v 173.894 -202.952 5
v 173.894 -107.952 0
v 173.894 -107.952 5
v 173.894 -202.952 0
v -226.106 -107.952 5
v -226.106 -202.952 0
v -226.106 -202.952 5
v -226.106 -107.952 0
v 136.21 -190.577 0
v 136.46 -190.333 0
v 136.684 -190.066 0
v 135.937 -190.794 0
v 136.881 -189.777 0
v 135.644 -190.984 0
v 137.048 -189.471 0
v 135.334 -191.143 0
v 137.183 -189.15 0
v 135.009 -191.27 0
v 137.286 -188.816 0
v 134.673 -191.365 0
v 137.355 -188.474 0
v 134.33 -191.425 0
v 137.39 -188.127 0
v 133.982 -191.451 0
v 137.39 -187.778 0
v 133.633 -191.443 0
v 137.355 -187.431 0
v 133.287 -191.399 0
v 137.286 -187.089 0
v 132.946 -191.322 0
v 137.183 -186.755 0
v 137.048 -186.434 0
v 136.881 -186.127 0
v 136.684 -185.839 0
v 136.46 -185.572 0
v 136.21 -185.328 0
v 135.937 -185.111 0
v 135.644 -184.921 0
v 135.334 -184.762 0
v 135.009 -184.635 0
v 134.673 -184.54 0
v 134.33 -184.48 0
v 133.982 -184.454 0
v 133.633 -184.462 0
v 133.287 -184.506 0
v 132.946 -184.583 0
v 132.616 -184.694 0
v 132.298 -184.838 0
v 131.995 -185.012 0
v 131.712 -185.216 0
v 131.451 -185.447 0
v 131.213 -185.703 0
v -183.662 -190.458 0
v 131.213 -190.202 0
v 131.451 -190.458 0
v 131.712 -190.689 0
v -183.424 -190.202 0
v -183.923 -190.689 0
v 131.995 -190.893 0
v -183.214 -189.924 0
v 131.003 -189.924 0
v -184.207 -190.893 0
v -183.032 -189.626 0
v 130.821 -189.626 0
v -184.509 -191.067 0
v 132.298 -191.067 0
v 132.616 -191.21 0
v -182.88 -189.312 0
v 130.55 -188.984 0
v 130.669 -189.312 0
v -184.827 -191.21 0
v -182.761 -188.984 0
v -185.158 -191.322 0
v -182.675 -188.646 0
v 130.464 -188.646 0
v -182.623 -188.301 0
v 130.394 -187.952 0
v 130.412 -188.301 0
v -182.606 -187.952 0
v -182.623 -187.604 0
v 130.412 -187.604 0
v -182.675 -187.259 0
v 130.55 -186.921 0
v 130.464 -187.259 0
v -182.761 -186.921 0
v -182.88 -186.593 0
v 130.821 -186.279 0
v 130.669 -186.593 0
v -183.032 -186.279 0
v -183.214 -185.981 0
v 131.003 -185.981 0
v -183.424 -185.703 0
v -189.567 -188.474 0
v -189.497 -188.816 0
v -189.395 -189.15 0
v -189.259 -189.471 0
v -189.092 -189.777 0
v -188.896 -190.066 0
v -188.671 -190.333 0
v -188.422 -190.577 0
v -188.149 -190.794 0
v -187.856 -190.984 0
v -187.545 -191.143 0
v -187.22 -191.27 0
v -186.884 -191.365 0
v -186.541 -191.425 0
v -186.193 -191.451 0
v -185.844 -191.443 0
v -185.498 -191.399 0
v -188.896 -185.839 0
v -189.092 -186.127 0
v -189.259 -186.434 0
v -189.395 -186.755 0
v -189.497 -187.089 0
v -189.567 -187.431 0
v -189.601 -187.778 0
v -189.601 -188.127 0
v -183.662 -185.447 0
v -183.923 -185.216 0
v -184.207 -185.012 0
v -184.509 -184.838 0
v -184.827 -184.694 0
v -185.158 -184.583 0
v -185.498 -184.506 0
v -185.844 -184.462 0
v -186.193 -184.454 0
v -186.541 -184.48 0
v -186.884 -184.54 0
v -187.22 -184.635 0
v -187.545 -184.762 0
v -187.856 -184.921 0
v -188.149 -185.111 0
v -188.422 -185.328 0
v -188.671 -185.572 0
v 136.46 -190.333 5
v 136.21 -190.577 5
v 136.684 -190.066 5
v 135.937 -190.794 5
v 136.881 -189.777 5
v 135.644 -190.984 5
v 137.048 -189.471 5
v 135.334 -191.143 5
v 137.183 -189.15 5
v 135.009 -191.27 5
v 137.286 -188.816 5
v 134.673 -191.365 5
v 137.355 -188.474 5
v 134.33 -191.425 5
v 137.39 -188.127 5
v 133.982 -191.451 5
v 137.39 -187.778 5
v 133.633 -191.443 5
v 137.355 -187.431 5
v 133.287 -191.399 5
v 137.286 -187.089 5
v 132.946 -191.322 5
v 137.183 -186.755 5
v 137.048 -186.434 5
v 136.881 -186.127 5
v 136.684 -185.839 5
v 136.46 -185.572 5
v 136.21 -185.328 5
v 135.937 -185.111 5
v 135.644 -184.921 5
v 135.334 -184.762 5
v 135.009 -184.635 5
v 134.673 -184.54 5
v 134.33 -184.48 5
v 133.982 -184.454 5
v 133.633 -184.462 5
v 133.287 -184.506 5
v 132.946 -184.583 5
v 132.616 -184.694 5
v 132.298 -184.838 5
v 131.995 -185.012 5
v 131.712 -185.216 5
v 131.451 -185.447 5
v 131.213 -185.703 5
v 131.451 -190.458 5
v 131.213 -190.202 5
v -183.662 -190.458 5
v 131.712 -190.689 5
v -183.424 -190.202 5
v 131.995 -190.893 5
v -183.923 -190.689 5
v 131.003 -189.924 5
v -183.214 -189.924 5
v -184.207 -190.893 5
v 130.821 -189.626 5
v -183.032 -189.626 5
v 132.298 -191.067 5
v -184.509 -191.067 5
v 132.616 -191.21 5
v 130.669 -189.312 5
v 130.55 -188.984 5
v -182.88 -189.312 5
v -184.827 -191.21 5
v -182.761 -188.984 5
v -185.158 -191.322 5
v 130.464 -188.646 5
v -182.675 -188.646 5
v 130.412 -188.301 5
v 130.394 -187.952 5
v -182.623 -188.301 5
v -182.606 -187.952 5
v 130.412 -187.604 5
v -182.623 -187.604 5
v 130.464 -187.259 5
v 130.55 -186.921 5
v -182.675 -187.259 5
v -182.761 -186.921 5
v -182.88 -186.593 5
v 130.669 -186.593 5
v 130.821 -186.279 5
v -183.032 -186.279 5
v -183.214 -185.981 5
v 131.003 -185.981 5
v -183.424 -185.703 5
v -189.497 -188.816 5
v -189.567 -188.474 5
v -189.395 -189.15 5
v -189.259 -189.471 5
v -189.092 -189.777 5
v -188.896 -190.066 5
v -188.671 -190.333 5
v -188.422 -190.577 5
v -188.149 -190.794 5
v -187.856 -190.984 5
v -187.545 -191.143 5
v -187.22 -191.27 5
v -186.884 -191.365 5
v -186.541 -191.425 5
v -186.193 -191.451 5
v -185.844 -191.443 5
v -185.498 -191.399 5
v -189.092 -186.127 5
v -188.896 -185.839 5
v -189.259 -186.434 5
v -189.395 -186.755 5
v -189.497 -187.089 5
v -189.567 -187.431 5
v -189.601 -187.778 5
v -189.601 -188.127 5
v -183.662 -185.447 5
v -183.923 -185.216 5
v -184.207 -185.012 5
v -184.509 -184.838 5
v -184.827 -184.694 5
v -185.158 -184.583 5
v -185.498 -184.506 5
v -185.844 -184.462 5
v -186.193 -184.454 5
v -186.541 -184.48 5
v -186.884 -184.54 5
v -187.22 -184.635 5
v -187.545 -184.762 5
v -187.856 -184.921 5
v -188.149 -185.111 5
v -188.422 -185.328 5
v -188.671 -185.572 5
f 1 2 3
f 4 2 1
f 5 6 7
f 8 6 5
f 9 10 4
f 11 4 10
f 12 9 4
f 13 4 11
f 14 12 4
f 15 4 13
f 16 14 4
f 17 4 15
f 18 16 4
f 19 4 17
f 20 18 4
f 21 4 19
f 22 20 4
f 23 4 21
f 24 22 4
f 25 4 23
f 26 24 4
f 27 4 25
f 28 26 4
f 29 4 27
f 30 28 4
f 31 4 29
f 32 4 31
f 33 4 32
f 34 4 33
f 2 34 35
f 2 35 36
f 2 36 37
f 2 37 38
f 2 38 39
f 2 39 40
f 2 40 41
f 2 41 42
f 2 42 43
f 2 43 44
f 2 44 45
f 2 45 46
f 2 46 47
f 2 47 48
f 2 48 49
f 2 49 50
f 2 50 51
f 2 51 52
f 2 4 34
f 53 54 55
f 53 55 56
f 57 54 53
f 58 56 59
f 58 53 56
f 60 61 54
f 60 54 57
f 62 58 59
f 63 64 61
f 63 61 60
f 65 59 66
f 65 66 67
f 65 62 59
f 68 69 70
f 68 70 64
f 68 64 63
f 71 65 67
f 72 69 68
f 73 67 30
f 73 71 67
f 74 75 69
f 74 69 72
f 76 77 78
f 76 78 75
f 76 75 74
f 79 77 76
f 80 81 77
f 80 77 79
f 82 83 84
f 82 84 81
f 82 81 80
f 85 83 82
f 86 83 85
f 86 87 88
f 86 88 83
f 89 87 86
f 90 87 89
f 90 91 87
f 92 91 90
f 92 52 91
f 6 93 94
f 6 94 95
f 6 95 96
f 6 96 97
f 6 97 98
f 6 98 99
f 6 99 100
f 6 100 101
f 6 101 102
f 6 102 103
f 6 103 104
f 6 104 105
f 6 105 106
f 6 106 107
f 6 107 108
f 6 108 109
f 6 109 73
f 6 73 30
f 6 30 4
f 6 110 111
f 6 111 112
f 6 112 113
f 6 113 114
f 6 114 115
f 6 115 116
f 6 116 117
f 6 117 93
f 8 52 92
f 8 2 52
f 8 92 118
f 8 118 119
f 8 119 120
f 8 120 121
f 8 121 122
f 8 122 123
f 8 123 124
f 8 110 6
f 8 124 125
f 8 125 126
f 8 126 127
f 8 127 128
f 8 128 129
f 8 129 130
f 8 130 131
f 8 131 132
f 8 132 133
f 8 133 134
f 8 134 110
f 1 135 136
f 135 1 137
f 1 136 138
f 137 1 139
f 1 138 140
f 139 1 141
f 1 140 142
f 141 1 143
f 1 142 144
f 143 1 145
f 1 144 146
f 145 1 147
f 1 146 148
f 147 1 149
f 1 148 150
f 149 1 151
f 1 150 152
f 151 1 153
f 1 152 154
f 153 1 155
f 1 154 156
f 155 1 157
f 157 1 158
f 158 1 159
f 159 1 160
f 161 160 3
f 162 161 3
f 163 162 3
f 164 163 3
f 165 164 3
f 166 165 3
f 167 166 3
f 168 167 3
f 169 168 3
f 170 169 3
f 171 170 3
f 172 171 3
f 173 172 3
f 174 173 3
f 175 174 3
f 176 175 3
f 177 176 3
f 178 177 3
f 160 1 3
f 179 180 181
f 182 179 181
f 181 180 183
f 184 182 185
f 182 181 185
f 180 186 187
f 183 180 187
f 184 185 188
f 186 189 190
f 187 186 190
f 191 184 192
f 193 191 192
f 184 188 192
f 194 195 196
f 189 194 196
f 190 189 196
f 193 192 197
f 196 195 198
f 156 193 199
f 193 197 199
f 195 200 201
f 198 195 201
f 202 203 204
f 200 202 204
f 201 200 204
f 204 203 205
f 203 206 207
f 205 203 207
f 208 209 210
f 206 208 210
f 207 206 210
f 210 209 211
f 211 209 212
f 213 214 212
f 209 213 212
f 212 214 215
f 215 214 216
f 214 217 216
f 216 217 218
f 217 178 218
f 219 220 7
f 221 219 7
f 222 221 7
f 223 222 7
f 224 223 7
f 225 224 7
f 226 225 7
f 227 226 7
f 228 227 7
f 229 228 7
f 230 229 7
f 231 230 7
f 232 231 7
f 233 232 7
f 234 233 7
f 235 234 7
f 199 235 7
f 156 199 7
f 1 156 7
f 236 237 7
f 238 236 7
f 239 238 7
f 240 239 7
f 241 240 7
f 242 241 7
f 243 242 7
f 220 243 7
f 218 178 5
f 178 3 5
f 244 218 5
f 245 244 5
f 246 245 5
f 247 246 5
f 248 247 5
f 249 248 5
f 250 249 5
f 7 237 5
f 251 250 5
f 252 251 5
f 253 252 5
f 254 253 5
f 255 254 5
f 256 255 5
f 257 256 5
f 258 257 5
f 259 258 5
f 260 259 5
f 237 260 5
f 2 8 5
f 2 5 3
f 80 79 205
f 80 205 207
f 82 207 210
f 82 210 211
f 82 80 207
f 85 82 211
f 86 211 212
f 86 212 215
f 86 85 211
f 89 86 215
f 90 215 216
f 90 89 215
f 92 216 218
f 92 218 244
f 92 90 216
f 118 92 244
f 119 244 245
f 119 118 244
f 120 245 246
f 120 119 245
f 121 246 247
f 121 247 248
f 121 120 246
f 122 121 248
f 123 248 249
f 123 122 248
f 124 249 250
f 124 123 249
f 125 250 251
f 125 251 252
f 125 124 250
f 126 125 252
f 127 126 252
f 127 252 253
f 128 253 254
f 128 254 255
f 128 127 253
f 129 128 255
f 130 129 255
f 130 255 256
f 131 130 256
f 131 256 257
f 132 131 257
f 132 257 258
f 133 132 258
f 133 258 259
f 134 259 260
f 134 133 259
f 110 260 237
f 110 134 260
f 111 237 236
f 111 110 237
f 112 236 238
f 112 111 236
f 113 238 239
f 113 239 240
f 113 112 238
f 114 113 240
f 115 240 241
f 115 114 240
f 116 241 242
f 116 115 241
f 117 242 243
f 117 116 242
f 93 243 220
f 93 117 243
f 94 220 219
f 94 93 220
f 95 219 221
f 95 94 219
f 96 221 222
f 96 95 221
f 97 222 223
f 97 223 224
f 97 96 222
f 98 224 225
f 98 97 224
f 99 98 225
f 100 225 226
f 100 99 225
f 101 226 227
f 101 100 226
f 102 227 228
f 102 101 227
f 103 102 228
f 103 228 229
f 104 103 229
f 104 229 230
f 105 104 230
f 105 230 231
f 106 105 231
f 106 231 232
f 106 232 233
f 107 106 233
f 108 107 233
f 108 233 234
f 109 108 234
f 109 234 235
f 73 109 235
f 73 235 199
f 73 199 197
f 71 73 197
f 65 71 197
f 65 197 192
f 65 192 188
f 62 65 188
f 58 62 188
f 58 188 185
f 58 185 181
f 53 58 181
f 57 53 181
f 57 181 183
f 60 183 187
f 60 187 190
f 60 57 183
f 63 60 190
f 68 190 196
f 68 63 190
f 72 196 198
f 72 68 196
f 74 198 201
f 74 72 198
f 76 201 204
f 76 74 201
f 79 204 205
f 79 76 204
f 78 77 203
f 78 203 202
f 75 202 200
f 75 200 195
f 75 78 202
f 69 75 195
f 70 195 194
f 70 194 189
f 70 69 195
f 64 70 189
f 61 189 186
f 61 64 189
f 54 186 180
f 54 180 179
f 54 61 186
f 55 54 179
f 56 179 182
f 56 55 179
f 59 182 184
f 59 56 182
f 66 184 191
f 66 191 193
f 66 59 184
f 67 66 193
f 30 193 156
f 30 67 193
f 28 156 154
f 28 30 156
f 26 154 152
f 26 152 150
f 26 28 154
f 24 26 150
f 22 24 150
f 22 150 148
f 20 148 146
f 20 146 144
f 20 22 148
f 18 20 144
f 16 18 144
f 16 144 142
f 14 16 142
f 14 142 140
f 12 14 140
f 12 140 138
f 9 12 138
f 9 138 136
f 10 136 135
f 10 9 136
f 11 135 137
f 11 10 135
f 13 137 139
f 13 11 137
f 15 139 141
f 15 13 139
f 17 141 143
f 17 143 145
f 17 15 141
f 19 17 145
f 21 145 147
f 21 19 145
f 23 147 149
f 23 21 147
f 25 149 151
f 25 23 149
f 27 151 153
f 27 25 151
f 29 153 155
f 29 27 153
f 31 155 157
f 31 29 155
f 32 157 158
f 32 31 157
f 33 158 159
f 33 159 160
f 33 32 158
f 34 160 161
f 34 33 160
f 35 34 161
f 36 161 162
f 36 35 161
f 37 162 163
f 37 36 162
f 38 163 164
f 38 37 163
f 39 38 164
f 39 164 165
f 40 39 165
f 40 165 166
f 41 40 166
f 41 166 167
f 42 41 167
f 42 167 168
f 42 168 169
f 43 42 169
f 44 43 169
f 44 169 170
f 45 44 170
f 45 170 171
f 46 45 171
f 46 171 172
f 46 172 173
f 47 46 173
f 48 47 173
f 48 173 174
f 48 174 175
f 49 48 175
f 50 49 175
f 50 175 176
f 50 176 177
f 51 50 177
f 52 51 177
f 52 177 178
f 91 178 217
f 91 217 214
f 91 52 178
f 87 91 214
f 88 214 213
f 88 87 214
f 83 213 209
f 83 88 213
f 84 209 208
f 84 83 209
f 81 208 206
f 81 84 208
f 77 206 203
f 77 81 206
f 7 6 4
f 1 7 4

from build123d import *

# Parameters (mm, degrees)
SKETCH_1_R      = 3.5
EXTRUDE_1_DEPTH = 5


with BuildPart() as part:
    # 草图1 → 凸台-拉伸1 (new body)
    with BuildSketch(Plane.XY):
        Polygon((-226.105641951, -107.952440937), (173.894358049, -107.952440937), (173.894358049, -202.952440937), (121.394358049, -202.952440937), (1.394358049, -202.952440937), (-53.605641951, -202.952440937), (-226.105641951, -202.952440937), align=None)
        with Locations((-186.105641951, -187.952440937)):
            Circle(SKETCH_1_R, mode=Mode.SUBTRACT)
        with Locations(Location((133.894358049, -187.952440937, 0), (0, 0, 180))):
            Circle(SKETCH_1_R, mode=Mode.SUBTRACT)
    extrude(amount=EXTRUDE_1_DEPTH)


solid = part.part
